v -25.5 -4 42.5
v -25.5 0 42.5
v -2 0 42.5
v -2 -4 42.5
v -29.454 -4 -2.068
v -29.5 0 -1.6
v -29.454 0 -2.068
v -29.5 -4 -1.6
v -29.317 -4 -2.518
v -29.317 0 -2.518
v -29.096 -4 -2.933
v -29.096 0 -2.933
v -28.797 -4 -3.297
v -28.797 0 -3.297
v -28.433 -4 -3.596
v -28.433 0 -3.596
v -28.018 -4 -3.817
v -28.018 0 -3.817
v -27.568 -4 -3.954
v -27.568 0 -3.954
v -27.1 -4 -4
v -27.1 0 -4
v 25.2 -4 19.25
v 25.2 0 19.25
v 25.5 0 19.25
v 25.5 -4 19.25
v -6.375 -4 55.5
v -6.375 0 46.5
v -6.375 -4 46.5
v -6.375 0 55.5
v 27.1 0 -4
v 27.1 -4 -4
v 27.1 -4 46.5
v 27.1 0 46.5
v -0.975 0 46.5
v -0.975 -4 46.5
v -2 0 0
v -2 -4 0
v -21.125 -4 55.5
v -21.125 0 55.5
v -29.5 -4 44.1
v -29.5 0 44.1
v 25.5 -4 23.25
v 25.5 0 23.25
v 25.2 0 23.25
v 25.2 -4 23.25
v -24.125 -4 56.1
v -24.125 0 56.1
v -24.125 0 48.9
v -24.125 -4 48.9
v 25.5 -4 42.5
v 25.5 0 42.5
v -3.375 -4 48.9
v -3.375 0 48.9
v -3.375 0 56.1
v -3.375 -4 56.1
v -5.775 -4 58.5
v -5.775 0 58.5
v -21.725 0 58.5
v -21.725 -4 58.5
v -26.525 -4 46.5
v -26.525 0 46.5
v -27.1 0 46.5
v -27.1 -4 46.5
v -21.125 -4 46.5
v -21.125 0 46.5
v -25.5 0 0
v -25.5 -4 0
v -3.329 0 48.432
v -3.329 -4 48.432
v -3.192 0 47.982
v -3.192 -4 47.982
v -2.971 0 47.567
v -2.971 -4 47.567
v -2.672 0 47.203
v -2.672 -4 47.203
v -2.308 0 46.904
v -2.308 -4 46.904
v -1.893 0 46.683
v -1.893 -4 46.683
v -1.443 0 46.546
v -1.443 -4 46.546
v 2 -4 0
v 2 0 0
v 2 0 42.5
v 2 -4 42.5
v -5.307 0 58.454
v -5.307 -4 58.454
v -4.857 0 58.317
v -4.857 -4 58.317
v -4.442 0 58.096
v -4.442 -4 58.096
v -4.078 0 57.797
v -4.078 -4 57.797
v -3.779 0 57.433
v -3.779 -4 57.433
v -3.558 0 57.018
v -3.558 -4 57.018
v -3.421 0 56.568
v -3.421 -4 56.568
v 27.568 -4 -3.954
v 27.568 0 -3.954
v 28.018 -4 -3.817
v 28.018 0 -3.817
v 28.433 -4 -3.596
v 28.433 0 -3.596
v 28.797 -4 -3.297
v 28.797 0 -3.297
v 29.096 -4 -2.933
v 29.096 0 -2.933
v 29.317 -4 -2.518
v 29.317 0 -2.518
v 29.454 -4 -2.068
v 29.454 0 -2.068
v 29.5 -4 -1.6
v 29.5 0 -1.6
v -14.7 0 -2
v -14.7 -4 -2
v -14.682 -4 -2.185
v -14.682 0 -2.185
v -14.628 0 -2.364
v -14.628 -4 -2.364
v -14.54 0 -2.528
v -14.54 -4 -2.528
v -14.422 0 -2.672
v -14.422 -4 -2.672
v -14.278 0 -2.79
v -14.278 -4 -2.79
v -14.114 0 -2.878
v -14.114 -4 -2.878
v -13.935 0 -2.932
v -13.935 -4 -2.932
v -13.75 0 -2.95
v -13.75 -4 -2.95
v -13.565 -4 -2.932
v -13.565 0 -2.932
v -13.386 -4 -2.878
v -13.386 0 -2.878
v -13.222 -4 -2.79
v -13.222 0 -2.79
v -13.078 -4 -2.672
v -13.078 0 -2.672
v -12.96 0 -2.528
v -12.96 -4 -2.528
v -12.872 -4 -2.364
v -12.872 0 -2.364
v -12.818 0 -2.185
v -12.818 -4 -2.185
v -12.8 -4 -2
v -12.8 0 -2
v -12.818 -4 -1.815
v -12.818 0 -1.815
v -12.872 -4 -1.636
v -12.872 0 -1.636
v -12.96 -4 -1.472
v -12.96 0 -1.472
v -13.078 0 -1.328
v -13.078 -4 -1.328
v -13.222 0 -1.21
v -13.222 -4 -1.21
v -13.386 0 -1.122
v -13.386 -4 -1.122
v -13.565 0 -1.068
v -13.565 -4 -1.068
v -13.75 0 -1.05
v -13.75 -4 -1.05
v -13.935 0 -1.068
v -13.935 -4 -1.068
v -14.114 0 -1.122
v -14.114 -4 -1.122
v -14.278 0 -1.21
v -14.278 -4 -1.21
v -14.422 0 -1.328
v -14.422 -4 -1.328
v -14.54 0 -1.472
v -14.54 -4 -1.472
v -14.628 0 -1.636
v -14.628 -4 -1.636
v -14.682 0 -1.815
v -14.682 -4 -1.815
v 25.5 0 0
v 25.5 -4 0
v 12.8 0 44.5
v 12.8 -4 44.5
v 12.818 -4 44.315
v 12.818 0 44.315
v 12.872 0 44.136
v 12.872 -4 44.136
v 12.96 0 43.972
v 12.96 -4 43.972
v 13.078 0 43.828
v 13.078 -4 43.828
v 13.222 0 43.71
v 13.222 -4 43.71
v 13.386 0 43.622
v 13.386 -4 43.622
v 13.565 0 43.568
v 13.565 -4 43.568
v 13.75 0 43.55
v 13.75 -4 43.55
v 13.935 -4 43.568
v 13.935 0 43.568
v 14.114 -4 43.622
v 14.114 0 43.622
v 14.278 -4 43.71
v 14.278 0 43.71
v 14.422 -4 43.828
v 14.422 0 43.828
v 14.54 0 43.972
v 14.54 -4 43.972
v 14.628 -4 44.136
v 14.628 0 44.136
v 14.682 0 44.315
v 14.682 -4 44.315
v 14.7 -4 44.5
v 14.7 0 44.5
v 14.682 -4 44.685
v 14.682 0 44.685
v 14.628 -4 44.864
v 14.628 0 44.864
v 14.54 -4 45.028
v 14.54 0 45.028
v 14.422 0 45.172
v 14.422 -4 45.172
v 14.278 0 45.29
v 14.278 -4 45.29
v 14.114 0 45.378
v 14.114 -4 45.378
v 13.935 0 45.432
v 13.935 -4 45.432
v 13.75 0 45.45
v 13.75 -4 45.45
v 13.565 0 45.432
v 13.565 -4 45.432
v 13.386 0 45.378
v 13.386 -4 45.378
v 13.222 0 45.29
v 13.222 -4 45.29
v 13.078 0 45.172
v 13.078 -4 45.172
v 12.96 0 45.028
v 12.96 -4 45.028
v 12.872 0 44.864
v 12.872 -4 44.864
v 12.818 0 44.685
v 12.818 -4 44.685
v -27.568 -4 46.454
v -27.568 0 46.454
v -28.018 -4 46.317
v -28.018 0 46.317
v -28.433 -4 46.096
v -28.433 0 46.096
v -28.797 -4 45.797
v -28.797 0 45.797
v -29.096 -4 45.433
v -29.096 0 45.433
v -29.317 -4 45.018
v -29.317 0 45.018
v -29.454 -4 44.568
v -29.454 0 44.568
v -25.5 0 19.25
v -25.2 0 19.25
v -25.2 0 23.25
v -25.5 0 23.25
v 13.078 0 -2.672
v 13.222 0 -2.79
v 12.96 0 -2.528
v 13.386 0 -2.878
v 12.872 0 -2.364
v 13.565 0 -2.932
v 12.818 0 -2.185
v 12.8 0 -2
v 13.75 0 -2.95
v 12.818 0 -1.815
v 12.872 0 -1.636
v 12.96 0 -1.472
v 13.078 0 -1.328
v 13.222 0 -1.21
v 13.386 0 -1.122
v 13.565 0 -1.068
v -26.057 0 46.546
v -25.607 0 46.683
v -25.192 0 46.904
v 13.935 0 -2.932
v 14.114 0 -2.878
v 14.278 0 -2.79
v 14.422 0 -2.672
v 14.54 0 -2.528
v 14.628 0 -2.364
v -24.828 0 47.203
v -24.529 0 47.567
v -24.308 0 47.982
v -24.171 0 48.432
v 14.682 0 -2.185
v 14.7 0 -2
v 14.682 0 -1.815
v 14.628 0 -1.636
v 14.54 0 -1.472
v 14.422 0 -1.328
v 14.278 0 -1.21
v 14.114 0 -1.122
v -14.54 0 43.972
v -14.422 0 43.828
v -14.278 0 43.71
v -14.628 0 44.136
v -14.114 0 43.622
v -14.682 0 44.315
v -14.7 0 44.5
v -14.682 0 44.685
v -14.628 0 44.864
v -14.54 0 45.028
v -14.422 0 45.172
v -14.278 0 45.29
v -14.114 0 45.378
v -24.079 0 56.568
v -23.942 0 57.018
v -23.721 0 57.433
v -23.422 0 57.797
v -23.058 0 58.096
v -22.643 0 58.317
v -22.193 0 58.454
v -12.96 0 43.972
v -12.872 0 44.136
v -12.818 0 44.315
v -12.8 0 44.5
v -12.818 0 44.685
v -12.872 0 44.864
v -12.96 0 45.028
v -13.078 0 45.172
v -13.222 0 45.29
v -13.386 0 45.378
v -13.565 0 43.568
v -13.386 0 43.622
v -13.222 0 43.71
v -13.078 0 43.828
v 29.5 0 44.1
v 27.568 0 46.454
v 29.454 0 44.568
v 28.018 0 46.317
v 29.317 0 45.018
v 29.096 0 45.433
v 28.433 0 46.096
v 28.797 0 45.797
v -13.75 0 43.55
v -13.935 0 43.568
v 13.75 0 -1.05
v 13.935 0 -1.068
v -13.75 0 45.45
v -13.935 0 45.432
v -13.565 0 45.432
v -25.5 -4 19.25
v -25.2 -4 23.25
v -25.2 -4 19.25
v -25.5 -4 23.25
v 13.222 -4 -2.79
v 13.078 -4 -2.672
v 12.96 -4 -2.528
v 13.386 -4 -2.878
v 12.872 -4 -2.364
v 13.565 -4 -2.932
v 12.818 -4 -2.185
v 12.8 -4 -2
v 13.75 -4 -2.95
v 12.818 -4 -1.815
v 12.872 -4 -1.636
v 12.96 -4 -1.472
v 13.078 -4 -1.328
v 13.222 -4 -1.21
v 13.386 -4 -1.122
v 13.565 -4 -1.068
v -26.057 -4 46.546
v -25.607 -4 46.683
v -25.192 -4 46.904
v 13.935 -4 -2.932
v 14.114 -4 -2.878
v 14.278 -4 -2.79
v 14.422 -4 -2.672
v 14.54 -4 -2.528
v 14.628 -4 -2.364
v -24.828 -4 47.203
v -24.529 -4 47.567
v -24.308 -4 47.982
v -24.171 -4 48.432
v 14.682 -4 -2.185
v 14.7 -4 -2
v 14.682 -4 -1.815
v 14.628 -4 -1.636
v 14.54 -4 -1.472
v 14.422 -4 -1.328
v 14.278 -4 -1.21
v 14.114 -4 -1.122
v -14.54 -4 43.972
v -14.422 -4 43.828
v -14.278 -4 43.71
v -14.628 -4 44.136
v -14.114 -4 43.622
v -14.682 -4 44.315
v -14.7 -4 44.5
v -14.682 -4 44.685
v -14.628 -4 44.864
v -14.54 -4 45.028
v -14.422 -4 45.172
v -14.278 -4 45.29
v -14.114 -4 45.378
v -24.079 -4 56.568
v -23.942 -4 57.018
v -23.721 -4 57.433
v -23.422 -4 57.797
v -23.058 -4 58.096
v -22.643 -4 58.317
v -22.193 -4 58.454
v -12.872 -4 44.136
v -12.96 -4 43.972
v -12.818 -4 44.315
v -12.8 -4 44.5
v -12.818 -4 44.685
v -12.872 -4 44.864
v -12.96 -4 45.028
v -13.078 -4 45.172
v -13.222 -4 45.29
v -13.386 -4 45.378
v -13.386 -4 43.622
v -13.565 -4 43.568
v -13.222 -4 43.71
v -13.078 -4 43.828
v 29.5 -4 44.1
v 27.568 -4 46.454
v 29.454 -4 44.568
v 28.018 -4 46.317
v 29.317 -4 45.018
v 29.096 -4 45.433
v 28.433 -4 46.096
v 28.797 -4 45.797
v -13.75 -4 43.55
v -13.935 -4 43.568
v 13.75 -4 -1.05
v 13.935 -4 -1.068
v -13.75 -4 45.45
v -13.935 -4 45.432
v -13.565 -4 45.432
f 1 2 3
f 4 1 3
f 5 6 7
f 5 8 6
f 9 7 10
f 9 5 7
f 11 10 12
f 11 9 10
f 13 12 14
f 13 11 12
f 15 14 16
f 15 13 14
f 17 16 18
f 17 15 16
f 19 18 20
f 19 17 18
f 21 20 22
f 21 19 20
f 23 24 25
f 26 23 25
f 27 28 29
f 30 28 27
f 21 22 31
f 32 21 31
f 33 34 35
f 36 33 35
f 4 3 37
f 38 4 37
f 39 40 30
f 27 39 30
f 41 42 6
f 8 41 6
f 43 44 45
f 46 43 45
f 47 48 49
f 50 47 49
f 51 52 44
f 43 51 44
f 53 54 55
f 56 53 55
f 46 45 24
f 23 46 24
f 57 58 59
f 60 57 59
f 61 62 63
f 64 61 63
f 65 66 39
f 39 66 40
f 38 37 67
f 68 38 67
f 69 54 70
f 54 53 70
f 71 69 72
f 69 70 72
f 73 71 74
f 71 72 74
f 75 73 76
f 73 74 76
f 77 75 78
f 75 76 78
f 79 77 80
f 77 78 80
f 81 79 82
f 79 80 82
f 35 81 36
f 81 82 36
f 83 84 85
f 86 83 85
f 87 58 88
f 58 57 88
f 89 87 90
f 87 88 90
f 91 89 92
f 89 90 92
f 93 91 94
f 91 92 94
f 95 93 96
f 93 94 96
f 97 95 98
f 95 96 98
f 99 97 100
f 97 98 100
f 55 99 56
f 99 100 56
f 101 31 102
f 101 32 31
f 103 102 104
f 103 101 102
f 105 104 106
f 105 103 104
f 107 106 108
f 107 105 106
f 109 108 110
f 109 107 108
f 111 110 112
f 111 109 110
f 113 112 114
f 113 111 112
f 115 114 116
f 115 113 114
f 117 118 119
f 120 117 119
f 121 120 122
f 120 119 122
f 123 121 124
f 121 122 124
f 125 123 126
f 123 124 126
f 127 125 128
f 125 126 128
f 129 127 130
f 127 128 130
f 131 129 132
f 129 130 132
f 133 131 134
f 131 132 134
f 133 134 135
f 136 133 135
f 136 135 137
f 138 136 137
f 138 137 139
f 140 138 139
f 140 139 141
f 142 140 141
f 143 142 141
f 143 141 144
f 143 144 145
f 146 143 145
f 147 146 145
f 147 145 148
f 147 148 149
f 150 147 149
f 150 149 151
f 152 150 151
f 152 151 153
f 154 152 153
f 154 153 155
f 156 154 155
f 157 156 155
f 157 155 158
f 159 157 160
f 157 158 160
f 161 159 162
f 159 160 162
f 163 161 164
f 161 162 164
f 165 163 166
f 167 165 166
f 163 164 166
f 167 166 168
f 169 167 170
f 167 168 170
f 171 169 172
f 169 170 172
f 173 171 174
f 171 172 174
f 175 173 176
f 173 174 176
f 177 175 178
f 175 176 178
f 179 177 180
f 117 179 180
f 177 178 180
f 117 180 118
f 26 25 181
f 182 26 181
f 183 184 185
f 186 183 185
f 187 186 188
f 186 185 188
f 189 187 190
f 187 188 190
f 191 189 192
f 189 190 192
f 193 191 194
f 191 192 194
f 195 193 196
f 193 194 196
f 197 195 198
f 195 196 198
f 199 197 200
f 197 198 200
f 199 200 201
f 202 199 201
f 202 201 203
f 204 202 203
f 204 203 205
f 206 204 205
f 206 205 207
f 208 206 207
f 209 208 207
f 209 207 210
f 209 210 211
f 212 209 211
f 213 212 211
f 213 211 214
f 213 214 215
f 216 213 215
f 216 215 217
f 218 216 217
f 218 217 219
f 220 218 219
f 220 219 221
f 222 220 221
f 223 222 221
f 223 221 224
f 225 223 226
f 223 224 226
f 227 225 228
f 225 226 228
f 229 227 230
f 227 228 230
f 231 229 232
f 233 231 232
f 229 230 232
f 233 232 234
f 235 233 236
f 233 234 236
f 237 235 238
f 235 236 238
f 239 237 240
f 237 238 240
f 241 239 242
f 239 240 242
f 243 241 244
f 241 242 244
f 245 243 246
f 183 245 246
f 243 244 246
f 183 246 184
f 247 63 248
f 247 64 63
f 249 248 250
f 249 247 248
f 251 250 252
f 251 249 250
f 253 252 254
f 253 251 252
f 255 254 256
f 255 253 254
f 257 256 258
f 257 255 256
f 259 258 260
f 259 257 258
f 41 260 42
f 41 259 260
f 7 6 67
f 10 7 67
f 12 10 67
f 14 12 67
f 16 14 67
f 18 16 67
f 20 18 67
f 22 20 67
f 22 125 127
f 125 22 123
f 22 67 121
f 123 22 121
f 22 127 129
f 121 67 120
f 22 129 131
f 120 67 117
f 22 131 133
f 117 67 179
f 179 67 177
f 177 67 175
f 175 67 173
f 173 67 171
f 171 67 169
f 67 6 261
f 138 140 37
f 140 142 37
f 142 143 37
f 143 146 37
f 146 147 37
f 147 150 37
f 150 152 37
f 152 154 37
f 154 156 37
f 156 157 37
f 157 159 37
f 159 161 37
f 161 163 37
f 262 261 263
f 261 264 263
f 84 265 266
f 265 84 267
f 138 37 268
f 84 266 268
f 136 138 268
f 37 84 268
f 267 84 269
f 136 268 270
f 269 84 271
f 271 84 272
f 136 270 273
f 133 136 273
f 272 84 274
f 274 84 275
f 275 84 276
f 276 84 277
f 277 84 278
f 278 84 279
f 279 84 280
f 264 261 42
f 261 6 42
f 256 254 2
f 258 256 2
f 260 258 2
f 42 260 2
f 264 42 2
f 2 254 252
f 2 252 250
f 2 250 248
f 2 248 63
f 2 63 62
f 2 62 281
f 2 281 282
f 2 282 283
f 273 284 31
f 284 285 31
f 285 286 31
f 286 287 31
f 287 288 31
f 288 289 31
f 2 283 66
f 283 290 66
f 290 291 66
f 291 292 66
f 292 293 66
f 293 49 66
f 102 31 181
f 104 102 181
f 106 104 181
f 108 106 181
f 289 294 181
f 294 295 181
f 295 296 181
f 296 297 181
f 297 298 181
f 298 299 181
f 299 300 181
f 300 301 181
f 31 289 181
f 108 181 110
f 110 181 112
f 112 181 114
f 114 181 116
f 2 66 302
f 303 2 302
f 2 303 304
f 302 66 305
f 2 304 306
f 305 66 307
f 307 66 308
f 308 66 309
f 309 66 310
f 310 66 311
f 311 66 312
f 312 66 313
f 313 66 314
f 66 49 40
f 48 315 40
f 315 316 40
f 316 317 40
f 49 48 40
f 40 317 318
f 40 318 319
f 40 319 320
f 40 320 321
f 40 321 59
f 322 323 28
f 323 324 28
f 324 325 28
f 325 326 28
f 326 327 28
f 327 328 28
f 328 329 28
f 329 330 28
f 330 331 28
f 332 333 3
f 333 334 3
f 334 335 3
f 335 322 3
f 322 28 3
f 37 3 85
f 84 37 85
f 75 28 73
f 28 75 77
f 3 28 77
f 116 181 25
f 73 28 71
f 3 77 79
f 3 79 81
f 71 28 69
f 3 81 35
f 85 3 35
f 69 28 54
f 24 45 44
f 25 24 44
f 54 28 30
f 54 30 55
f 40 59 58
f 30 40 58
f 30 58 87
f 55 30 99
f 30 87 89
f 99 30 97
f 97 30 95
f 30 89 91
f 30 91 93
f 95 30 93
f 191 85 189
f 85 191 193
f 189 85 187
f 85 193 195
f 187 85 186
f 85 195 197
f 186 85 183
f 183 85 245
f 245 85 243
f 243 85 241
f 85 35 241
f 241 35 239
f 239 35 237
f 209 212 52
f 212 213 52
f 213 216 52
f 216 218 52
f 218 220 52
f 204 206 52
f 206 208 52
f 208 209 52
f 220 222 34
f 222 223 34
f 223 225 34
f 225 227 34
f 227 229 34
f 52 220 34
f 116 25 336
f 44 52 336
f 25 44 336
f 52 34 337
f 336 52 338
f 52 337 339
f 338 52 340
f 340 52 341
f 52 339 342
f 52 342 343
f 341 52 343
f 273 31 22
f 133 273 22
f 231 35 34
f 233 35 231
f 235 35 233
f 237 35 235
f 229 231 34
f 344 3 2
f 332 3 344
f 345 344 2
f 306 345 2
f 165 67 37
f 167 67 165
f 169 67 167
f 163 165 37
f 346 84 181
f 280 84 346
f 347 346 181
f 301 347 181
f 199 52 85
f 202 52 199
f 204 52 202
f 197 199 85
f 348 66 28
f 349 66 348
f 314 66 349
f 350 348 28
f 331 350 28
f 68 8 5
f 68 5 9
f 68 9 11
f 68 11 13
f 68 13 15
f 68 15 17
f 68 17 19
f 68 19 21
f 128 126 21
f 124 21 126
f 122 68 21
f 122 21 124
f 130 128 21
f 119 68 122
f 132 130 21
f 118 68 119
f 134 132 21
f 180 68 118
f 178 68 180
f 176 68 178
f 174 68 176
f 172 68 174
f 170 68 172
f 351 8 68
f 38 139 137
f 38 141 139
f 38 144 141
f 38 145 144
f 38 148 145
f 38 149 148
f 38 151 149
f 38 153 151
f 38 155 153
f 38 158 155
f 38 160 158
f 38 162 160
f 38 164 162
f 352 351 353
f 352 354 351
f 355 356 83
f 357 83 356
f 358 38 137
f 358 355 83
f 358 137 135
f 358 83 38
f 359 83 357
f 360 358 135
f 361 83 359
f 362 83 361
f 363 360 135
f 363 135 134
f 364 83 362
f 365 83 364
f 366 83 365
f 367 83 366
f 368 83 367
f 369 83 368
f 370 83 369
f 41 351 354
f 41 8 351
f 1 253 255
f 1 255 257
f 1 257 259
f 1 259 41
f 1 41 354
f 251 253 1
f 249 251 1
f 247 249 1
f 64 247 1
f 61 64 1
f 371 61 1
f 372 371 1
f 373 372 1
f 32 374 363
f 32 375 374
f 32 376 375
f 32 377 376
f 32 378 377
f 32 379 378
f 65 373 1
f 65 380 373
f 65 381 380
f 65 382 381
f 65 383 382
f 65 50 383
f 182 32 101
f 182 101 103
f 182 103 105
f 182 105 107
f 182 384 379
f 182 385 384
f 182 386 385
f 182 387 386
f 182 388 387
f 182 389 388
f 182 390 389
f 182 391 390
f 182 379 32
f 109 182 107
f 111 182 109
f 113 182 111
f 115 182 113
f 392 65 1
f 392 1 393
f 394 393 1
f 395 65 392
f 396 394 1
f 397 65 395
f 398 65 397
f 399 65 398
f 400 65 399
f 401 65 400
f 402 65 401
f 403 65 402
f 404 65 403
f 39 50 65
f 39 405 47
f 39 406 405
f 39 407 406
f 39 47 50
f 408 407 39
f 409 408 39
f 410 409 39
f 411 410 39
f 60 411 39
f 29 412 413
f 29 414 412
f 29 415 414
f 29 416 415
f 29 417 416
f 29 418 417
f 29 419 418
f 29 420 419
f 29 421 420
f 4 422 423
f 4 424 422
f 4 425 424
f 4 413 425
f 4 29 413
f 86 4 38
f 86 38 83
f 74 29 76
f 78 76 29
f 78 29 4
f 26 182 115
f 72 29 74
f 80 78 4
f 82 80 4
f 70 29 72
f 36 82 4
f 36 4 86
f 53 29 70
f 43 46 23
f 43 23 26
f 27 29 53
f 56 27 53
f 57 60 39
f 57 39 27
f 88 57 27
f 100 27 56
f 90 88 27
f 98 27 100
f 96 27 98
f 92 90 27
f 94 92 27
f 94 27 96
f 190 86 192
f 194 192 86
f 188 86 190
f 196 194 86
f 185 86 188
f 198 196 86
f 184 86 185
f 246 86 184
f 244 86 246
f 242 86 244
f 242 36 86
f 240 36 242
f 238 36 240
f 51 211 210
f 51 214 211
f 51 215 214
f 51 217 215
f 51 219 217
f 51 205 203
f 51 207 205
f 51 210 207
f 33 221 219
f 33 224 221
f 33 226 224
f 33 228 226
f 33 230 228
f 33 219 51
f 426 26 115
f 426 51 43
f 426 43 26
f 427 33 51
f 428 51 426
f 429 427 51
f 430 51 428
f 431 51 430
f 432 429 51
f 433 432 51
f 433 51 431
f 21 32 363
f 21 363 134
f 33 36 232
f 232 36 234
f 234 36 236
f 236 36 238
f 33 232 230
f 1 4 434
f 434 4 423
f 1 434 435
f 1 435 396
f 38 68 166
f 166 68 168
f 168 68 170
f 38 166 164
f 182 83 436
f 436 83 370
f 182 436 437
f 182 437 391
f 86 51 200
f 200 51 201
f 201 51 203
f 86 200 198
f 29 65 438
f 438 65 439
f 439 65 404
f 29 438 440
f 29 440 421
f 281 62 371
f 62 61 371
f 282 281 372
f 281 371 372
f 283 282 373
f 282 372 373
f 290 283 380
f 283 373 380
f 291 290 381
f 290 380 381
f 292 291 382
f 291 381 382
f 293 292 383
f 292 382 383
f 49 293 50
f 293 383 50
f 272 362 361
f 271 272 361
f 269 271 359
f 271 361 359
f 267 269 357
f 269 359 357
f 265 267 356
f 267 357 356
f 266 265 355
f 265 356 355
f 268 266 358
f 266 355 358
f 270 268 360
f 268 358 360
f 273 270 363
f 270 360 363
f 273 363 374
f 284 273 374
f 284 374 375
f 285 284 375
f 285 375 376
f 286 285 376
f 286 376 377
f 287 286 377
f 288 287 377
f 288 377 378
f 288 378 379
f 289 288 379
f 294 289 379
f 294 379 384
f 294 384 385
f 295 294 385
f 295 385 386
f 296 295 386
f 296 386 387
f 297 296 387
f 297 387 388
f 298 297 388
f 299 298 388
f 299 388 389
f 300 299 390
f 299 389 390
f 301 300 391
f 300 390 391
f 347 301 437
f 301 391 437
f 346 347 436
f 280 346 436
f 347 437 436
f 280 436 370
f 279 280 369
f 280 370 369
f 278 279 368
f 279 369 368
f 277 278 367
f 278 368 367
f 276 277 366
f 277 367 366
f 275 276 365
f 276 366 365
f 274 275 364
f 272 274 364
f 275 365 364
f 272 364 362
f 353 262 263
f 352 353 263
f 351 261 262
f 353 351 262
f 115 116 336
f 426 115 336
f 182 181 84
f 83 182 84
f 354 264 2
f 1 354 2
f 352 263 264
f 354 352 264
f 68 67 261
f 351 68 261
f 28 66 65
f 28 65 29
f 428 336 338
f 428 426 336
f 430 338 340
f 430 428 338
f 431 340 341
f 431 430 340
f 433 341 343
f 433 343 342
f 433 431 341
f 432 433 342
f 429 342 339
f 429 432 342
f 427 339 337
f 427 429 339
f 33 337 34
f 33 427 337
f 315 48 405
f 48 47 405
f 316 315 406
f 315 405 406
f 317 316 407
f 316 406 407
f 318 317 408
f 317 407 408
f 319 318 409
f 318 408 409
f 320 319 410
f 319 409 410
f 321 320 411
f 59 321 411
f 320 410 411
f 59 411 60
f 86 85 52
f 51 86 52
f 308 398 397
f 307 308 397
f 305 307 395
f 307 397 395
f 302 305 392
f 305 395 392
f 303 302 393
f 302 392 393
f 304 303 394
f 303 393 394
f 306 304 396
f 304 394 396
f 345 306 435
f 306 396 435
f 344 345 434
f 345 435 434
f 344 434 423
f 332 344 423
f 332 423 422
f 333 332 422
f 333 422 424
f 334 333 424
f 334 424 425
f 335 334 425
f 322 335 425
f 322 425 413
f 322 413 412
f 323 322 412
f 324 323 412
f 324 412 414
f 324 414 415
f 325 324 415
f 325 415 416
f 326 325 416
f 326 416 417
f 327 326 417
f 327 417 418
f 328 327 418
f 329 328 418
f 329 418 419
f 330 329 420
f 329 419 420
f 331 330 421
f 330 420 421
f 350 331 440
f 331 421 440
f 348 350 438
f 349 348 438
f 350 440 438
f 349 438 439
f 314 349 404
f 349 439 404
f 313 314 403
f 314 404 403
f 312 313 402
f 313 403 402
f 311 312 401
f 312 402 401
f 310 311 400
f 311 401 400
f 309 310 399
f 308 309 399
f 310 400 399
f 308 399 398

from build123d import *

# Parameters (mm, degrees)
F0_W     = 14.75
F0_H     = 9
F1_DEPTH = 4
F2_R     = 2.4
F3_D     = 1.9


with BuildPart() as f1:
    # F0 (on Front) → F1 (new body)
    with BuildSketch(Plane.XZ):
        Polygon((-24.125, 46.5), (-29.5, 46.5), (-29.5, -4), (29.5, -4), (29.5, 46.5), (-3.375, 46.5), (-3.375, 58.5), (-24.125, 58.5), align=None)
        Polygon((-2, 42.5), (-2, 0), (-25.5, 0), (-25.5, 19.25), (-25.2, 19.25), (-25.2, 23.25), (-25.5, 23.25), (-25.5, 42.5), align=None, mode=Mode.SUBTRACT)
        Polygon((25.5, 0), (2, 0), (2, 42.5), (25.5, 42.5), (25.5, 23.25), (25.2, 23.25), (25.2, 19.25), (25.5, 19.25), align=None, mode=Mode.SUBTRACT)
        with Locations((-13.75, 51)):
            Rectangle(F0_W, F0_H, mode=Mode.SUBTRACT)
    extrude(amount=F1_DEPTH)

    # F2
    f2_edges = [f1.edges().sort_by_distance(p)[0] for p in [
        (-24.125, -2, 58.5),
        (-24.125, -2, 46.5),
        (-29.5, -2, 46.5),
        (-3.375, -2, 58.5),
        (29.5, -2, 46.5),
        (-3.375, -2, 46.5),
        (29.5, -2, -4),
        (-29.5, -2, -4),
    ]]
    fillet(f2_edges, radius=F2_R)

    # F3 (through all)
    with Locations(Plane(origin=(0, 0, 0), x_dir=(1, 0, 0), z_dir=(0, 1, 0))):
        with Locations((-13.75, 2), (13.75, 2), (-13.75, -44.5), (13.75, -44.5)):
            Hole(F3_D / 2)


solid = f1.part
